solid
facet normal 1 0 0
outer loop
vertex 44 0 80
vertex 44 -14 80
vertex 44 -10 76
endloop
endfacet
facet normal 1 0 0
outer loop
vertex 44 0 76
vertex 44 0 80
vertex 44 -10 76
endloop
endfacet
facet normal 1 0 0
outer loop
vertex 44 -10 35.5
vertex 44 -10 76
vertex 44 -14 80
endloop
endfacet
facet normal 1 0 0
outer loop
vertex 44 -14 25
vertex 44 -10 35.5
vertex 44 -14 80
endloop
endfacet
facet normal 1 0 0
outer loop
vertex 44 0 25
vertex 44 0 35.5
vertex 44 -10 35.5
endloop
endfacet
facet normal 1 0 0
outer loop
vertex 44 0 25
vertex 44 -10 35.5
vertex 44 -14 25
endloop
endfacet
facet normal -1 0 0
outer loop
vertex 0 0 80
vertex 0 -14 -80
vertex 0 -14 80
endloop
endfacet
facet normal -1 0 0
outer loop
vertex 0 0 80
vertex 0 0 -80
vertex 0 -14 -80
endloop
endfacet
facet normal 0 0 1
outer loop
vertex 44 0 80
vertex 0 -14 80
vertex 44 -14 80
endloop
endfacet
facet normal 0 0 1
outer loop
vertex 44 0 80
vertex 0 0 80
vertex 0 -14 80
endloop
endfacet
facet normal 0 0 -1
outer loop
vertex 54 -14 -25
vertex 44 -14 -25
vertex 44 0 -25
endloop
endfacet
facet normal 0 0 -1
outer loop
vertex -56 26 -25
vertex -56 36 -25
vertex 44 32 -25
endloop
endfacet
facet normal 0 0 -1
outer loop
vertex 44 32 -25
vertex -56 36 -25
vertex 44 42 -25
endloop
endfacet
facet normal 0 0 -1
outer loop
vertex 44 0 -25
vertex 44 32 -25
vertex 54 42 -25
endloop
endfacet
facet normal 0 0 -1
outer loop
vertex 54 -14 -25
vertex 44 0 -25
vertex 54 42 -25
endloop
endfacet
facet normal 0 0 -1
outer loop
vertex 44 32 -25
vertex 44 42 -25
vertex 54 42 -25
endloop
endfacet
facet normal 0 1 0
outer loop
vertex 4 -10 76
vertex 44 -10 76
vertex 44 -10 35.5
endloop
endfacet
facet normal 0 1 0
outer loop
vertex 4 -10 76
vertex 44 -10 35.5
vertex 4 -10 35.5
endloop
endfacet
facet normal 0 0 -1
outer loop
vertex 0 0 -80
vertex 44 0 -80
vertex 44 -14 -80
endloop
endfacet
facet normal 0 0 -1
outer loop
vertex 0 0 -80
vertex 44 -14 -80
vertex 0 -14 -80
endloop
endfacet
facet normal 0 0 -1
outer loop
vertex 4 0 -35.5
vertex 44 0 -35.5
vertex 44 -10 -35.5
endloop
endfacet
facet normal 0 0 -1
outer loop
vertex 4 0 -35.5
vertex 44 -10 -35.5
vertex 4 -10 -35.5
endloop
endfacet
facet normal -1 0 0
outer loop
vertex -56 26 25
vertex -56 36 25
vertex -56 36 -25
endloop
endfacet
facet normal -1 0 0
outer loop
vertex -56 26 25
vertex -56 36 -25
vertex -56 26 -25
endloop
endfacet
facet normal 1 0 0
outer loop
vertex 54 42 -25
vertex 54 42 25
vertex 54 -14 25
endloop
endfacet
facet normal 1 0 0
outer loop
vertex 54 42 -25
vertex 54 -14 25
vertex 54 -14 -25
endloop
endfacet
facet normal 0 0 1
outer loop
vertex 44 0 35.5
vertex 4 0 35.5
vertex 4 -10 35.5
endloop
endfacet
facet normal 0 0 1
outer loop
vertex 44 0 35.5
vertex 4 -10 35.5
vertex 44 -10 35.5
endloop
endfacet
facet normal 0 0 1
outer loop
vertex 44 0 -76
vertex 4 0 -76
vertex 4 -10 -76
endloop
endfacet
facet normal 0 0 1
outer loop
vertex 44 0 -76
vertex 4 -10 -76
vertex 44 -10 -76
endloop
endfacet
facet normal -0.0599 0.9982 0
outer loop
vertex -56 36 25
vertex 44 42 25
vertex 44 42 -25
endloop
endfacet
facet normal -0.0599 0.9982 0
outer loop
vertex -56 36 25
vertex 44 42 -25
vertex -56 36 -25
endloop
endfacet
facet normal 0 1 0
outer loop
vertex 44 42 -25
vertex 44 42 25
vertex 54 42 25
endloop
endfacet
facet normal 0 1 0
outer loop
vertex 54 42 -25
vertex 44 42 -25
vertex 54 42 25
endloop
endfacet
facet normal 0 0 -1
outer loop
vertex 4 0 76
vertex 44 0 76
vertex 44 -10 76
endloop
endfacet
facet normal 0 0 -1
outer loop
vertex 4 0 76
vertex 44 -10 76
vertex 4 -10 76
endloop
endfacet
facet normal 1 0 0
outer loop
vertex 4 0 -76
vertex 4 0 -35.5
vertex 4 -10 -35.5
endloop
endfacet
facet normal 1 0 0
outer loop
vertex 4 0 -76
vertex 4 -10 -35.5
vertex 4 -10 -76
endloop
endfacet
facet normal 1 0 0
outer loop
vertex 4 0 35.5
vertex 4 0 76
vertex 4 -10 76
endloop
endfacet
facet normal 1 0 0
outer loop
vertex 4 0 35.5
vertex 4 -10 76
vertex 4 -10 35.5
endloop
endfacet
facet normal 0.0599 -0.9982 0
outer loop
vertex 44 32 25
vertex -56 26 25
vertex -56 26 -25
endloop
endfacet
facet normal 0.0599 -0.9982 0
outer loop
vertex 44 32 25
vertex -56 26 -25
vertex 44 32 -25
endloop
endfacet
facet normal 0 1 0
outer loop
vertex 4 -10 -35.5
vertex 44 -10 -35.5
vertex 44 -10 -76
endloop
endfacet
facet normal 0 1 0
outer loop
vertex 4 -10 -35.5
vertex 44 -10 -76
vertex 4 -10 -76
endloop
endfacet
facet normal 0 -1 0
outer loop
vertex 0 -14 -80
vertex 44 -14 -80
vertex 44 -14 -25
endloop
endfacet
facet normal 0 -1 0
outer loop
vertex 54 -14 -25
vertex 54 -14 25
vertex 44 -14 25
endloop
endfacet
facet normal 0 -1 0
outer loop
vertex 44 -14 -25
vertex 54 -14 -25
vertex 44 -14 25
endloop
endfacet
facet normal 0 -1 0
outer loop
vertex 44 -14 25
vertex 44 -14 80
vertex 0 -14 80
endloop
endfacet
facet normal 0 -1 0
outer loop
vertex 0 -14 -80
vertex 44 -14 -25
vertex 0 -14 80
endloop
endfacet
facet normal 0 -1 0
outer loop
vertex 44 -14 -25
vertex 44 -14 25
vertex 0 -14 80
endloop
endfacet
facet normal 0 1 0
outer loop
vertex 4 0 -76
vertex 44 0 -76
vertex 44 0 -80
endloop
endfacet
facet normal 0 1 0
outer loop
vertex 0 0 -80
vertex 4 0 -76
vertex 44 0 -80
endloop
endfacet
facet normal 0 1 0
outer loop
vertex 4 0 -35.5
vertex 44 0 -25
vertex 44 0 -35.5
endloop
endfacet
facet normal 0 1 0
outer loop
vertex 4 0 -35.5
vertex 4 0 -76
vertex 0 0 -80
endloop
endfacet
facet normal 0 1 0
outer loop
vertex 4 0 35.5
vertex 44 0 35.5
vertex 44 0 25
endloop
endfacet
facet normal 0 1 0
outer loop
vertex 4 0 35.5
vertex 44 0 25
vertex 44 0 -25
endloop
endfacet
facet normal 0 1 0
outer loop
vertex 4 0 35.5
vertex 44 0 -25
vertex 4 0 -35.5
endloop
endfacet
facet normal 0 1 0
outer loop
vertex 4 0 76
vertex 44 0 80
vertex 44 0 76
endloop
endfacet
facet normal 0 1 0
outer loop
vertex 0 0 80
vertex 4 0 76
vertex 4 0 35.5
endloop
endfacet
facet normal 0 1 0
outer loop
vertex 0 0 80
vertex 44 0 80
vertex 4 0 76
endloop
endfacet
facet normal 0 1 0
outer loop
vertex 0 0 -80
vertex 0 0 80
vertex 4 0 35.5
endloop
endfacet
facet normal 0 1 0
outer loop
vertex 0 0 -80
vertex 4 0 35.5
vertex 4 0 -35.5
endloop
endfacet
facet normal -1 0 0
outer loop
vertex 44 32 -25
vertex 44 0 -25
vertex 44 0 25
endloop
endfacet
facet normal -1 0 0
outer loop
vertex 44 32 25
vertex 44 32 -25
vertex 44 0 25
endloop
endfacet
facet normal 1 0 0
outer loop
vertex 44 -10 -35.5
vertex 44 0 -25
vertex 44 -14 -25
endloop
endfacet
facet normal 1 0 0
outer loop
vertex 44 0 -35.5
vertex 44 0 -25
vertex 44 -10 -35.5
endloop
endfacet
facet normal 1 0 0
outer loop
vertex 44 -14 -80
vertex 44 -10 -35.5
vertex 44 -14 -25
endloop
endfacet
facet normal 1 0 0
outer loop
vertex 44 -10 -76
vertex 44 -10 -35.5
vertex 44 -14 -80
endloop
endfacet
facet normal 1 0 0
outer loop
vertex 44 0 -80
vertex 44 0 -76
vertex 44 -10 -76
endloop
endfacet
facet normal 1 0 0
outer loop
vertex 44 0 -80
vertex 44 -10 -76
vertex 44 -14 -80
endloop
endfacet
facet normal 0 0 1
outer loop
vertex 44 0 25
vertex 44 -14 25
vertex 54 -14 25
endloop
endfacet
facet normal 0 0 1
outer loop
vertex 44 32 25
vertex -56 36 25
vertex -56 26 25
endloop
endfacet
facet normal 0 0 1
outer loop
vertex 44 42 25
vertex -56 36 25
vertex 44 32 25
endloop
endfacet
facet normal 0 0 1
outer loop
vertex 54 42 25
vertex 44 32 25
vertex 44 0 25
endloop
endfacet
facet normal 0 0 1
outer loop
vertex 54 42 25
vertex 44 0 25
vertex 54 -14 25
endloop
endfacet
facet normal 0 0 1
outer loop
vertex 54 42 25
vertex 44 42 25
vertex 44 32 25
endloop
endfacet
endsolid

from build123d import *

# Parameters (mm, degrees)
PAD_DEPTH    = 10
SKETCH001_W  = 10
SKETCH001_H  = 50
PAD001_DEPTH = 52
PAD002_DEPTH = 4
PAD003_DEPTH = 50


with BuildPart() as part:
    # Sketch → Pad (new body)
    with BuildSketch(Plane.XZ):
        Polygon((44, 76), (4, 76), (4, 35.5), (44, 35.5), (44, -35.5), (4, -35.5), (4, -76), (44, -76), (44, -80), (0, -80), (0, 80), (44, 80), align=None)
    extrude(amount=PAD_DEPTH)

    # Sketch001 (on Face14 of Pad) → Pad001 (join)
    with BuildSketch(Plane.XZ.offset(10)):
        with Locations((49, 0)):
            Rectangle(SKETCH001_W, SKETCH001_H)
    extrude(amount=-PAD001_DEPTH)

    # Sketch002 (on Face20 of Pad001) → Pad002 (join)
    with BuildSketch(Plane.XZ.offset(10)):
        Polygon((44, 80), (44, 25), (54, 25), (54, -25), (44, -25), (44, -80), (0, -80), (0, 80), align=None)
    extrude(amount=PAD002_DEPTH)

    # Sketch003 (on Face20 of Pad002) → Pad003 (join)
    with BuildSketch(Plane.XY.offset(25)):
        Polygon((44, 42), (-56, 36), (-56, 26), (44, 32), align=None)
    extrude(amount=-PAD003_DEPTH)


solid = part.part
